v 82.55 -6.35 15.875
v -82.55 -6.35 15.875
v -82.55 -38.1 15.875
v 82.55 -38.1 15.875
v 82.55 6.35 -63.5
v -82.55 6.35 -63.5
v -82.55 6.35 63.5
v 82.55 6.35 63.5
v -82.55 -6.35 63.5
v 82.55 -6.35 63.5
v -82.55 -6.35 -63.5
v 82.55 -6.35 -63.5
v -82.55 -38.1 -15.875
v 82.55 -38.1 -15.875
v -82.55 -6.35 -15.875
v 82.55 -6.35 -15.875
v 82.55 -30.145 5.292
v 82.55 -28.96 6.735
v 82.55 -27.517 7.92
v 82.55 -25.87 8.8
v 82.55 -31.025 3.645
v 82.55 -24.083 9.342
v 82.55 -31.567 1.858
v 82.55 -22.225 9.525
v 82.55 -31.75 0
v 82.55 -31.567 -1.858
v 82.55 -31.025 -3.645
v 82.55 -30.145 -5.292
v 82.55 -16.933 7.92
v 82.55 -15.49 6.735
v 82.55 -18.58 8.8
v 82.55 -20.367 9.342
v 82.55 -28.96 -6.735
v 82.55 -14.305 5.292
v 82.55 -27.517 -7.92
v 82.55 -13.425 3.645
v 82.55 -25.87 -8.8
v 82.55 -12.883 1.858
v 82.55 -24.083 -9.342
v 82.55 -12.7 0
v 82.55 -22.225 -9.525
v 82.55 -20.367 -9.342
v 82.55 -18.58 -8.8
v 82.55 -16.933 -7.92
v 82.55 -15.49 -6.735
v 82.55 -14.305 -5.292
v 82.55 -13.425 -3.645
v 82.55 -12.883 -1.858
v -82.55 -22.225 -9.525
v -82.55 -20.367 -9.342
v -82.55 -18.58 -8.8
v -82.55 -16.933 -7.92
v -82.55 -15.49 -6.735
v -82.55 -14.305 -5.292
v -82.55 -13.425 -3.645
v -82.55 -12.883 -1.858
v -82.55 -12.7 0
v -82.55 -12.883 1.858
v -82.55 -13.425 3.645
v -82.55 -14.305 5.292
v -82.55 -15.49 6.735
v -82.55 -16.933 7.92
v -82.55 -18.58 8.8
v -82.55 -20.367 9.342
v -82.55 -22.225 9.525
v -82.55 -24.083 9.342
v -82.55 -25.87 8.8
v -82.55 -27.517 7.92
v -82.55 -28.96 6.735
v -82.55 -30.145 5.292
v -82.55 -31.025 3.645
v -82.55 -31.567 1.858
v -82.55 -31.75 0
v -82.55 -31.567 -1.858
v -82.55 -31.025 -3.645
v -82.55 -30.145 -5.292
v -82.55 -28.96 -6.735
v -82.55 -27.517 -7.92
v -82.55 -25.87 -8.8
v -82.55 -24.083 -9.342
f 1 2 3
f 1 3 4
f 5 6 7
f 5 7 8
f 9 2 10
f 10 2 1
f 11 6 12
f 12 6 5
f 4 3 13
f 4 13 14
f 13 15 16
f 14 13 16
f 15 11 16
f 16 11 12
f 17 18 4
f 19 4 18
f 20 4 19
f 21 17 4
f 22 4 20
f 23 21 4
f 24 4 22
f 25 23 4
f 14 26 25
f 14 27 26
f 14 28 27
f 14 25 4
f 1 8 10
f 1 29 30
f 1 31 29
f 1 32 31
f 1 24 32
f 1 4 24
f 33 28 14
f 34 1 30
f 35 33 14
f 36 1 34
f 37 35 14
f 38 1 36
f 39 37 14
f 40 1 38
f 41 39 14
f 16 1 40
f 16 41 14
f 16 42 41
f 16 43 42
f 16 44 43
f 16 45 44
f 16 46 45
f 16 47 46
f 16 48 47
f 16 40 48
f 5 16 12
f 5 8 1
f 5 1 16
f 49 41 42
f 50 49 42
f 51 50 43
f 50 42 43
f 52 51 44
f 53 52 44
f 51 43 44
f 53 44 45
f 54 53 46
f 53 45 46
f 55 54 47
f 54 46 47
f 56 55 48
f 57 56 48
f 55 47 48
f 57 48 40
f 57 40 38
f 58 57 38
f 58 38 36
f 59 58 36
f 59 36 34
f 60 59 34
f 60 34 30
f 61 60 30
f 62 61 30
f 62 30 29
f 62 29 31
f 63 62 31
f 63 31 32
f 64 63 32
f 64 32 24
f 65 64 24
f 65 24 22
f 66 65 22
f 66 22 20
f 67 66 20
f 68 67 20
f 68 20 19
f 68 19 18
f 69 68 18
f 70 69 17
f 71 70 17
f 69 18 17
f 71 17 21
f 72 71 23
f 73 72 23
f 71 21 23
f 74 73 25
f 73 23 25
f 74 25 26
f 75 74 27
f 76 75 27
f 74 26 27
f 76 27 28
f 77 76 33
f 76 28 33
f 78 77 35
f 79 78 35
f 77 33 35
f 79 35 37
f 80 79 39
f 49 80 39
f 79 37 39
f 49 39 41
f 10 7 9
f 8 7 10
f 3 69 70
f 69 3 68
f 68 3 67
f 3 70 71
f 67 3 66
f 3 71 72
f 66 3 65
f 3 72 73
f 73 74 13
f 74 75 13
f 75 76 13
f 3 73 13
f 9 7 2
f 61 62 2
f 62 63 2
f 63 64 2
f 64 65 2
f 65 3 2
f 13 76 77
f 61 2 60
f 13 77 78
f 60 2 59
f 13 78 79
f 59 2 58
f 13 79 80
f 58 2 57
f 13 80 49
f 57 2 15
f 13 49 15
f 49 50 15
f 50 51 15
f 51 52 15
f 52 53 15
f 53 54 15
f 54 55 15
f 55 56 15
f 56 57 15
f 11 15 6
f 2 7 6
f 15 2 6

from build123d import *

# Parameters (mm, degrees)
SKETCH1_W           = 165.1
SKETCH1_H           = 127
BOSS_EXTRUDE1_DEPTH = 6.35
SKETCH2_W           = 165.1
SKETCH2_H           = 31.75
BOSS_EXTRUDE2_DEPTH = 31.75
CUT_EXTRUDE1_REACH  = 167.1
SKETCH3_R           = 9.525


with BuildPart() as part:
    # Sketch1 → Boss-Extrude1 (new body, symmetric)
    with BuildSketch(Plane(origin=(0, 0, 0), x_dir=(1, 0, 0), z_dir=(0, 1, 0))):
        Rectangle(SKETCH1_W, SKETCH1_H)
    extrude(amount=BOSS_EXTRUDE1_DEPTH, both=True)

    # Sketch2 → Boss-Extrude2 (add)
    with BuildSketch(Plane.XZ.offset(6.35)):
        Rectangle(SKETCH2_W, SKETCH2_H)
    extrude(amount=BOSS_EXTRUDE2_DEPTH)

    # Sketch3 → Cut-Extrude1 (cut, up to next)
    with BuildSketch(Plane(origin=(82.55, 0, 0), x_dir=(0, 0, -1), z_dir=(1, 0, 0)), mode=Mode.PRIVATE) as cut_extrude1_sk1:
        with Locations((0, -22.225)):
            Circle(SKETCH3_R)
    cut_extrude1_tool1 = extrude(cut_extrude1_sk1.sketch, amount=-CUT_EXTRUDE1_REACH, mode=Mode.PRIVATE) & part.part
    add(cut_extrude1_tool1.solids().sort_by_distance((82.55, -22.225, 0))[0], mode=Mode.SUBTRACT)


solid = part.part
